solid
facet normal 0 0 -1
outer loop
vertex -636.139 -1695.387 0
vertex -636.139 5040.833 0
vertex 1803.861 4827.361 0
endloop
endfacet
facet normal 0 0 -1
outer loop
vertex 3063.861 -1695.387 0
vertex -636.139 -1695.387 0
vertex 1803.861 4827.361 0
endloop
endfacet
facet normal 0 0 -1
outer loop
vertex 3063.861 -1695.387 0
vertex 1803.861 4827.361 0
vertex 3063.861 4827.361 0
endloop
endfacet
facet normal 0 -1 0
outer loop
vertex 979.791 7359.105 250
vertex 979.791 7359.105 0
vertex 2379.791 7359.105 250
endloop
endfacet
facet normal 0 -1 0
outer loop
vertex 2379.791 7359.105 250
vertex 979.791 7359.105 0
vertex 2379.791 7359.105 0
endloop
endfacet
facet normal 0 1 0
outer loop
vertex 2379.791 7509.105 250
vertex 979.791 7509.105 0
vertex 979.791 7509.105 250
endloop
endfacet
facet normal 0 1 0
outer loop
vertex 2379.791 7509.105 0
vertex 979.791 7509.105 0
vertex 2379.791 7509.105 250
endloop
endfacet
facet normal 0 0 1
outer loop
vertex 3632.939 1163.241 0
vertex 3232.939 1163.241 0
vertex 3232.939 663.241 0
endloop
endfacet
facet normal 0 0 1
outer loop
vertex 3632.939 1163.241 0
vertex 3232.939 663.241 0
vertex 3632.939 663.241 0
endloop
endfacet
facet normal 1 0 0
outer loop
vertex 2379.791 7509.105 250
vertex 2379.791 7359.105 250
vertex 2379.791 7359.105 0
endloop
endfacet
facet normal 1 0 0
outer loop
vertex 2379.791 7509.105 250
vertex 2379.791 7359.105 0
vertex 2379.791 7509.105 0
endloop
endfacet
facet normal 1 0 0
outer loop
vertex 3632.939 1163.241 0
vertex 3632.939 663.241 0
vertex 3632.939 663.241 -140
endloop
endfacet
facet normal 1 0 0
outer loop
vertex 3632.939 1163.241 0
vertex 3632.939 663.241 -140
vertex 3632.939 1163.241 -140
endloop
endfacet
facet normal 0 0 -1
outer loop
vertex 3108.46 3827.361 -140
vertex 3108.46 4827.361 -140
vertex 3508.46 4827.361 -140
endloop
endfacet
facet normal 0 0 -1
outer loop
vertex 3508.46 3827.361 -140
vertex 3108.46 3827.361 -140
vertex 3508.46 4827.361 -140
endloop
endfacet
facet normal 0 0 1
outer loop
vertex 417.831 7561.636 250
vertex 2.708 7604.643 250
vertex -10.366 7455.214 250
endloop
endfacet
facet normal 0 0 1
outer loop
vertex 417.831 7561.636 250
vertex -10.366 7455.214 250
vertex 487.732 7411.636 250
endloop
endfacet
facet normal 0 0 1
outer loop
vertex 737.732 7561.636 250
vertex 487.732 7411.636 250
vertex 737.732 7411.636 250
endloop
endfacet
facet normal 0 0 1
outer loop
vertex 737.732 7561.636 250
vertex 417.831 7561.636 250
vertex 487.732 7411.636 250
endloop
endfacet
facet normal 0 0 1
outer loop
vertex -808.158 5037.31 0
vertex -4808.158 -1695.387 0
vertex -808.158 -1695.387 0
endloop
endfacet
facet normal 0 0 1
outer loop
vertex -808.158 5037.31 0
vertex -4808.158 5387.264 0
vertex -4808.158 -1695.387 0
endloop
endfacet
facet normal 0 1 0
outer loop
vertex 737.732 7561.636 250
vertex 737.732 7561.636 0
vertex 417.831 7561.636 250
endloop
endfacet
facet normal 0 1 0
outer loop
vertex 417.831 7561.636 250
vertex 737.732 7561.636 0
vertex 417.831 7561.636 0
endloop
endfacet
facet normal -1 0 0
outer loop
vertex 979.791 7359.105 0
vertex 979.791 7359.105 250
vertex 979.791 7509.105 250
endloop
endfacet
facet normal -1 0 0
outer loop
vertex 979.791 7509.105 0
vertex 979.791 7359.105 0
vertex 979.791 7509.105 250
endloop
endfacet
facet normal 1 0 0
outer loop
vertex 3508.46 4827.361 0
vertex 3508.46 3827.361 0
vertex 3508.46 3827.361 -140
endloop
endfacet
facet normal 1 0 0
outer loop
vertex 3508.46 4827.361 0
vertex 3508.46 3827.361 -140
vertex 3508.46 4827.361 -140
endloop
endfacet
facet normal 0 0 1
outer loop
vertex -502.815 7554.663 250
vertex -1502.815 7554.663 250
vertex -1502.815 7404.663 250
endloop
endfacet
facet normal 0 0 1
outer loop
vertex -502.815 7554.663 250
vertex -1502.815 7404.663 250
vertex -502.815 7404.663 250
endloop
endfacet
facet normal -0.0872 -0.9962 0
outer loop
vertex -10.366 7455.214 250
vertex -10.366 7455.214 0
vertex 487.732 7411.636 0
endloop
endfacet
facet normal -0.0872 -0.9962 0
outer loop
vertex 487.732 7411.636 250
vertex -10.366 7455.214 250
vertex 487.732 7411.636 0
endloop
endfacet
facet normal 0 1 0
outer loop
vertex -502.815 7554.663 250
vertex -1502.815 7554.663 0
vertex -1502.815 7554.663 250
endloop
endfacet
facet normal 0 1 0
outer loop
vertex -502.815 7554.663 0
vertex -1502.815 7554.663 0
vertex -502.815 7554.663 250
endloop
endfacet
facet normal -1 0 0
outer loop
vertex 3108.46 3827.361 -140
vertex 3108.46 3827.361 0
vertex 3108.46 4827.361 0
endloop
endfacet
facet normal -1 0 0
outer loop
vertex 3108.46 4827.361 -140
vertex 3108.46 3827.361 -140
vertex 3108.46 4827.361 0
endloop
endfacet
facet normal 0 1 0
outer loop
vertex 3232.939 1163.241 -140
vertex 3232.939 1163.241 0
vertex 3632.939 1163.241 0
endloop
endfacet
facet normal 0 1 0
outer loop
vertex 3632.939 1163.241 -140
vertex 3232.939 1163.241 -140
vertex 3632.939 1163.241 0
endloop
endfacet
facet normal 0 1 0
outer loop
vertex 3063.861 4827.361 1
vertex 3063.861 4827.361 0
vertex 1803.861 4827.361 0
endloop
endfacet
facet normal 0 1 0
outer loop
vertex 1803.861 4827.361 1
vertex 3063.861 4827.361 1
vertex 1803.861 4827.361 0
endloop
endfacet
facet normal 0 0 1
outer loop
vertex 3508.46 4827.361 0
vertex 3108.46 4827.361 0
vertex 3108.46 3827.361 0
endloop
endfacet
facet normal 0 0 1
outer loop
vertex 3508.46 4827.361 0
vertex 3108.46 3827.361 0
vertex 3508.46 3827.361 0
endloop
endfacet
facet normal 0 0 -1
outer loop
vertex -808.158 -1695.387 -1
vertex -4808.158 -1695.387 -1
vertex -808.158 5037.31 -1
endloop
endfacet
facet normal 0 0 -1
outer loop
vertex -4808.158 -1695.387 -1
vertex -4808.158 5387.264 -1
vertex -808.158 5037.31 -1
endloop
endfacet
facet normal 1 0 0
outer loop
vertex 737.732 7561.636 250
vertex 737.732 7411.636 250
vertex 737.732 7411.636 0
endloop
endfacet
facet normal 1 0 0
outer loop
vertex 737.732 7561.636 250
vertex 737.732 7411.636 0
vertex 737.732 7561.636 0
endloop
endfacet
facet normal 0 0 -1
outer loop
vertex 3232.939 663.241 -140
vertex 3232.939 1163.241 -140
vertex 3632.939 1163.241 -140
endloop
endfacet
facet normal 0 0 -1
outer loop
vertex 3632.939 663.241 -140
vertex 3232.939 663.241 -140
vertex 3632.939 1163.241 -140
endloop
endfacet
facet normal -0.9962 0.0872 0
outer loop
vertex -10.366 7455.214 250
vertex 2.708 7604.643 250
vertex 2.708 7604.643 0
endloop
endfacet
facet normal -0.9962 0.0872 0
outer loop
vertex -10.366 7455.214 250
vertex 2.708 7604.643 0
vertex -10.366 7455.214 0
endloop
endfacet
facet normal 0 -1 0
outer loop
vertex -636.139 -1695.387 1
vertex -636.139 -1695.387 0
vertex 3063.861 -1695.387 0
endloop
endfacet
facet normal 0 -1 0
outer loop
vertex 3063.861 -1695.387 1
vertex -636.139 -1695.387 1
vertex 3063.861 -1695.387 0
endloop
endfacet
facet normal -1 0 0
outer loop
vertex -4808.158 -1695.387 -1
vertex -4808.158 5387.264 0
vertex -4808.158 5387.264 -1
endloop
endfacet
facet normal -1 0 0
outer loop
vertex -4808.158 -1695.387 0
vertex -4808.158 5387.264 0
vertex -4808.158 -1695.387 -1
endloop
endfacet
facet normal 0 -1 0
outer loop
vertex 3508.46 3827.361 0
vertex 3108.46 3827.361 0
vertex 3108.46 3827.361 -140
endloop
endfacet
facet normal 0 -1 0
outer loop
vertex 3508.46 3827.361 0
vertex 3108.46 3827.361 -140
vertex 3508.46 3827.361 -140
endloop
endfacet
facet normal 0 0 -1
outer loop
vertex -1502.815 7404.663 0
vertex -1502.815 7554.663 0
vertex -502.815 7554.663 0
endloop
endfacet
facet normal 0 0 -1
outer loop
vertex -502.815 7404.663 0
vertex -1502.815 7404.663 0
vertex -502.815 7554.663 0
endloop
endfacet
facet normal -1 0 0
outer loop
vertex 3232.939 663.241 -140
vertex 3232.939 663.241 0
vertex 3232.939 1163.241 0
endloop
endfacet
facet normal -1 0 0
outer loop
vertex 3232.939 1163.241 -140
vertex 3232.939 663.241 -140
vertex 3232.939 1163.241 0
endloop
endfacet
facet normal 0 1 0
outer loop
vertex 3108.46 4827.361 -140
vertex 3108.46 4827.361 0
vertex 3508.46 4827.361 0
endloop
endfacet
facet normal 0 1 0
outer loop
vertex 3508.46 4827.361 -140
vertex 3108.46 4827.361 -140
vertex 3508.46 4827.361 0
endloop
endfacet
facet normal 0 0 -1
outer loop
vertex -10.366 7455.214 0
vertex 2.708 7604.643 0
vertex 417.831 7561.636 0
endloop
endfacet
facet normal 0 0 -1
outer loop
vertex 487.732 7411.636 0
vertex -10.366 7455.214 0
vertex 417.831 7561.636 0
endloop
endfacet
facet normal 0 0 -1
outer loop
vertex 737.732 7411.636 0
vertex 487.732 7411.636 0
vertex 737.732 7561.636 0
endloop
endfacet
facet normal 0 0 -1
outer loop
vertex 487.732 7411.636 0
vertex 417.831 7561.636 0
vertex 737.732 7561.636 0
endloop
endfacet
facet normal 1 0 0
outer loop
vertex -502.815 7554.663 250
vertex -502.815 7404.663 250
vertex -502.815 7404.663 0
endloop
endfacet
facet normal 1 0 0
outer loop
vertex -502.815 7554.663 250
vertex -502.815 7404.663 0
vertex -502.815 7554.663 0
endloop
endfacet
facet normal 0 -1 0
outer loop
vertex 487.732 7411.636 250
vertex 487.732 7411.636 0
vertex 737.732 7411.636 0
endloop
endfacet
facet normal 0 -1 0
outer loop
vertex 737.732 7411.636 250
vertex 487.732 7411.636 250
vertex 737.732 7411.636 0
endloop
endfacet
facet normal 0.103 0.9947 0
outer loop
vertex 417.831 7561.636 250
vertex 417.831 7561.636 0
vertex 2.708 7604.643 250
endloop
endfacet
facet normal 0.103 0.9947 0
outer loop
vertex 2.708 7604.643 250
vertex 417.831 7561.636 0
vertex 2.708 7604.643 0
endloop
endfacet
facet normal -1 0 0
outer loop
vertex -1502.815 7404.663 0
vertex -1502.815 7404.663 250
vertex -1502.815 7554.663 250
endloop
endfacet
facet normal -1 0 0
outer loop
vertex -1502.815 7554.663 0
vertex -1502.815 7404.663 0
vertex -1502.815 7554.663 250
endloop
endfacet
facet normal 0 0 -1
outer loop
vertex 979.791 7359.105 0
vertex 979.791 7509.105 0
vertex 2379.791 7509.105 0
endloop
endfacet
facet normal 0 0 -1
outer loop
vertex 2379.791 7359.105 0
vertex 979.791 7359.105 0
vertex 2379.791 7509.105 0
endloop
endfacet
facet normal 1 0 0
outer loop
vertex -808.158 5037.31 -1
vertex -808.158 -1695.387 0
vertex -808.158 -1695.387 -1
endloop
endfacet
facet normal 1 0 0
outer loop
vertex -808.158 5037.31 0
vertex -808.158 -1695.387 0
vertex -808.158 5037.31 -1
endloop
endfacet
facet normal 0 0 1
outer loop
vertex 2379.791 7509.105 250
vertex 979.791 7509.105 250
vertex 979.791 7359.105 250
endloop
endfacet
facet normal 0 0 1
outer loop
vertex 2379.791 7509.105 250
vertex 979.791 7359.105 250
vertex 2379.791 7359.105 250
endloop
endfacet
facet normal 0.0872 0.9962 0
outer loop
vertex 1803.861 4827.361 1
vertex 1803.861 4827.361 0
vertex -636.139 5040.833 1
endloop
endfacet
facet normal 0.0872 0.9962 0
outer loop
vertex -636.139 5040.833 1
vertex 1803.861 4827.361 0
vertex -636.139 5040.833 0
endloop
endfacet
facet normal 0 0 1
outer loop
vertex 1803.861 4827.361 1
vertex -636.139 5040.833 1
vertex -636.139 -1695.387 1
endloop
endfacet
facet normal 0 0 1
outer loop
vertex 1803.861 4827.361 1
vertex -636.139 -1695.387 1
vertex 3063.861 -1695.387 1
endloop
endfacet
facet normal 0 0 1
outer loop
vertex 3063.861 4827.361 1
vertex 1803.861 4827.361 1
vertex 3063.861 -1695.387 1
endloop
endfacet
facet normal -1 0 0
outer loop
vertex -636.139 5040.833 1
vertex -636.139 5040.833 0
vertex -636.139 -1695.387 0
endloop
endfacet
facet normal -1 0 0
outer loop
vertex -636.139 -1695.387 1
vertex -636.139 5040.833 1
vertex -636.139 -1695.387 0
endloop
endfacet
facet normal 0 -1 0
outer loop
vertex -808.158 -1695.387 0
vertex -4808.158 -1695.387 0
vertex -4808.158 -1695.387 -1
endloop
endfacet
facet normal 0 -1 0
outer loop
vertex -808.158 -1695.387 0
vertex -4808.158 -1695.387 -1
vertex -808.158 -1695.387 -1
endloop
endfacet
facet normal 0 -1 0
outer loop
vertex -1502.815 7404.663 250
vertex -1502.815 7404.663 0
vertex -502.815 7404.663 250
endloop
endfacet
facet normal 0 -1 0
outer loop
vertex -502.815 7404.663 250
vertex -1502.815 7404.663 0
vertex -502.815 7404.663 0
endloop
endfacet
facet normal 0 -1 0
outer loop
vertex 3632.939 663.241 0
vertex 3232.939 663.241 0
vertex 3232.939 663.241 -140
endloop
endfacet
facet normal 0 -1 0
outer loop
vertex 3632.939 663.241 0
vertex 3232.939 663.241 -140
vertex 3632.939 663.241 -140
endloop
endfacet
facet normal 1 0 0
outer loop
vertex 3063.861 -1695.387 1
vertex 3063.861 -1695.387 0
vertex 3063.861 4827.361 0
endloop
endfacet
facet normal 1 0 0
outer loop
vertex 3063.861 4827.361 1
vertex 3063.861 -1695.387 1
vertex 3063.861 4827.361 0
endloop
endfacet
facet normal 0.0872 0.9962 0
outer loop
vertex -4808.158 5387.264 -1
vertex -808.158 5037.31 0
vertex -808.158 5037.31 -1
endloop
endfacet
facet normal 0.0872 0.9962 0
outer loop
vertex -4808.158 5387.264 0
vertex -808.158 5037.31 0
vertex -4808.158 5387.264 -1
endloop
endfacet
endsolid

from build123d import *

# Parameters (mm, degrees)
F0_W     = 400
F0_H     = 1000
F1_DEPTH = 140
F0_H_2   = 500
F2_DEPTH = 1
F4_DEPTH = 1
F0_W_2   = 1000
F0_H_3   = 150
F6_DEPTH = 250
F0_W_3   = 1400


# Not quite as in the source:
# - the program builds the solid bodies; features that only make, move or delete a surface that nothing else refers to are left out


with BuildPart() as f1:
    # F0 (on Top) → F1 (new body)
    with BuildSketch(Plane.XY):
        with Locations((3308.4599494934, 4327.3605238324)):
            Rectangle(F0_W, F0_H)
    extrude(amount=-F1_DEPTH)


with BuildPart() as f1b:
    # F0 (on Top) → F1, piece 2 (new body)
    with BuildSketch(Plane.XY):
        with Locations((3432.9387664795, 913.2413864136)):
            Rectangle(F0_W, F0_H_2)
    extrude(amount=-F1_DEPTH)


with BuildPart() as f2:
    # F0 (on Top) → F2 (new body)
    with BuildSketch(Plane.XY):
        Polygon((-4808.1577976546, -1695.3865286843), (-808.1577976546, -1695.3865286843), (-808.1577976546, 5037.3098283165), (-4808.1577976546, 5387.2644824202), align=None)
    extrude(amount=-F2_DEPTH)


with BuildPart() as f4:
    # F0 (on Top) → F4 (new body)
    with BuildSketch(Plane.XY):
        Polygon((-636.1389268665, 5040.8328628357), (-636.1389268665, -1695.3865286843), (3063.8610731335, -1695.3865286843), (3063.8610731335, 4827.3605238324), (1803.8610731335, 4827.3605238324), align=None)
    extrude(amount=F4_DEPTH)


with BuildPart() as f6:
    # F0 (on Top) → F6 (new body)
    with BuildSketch(Plane.XY):
        with Locations((-1002.815246582, 7479.6626091003)):
            Rectangle(F0_W_2, F0_H_3)
    extrude(amount=F6_DEPTH)


with BuildPart() as f6b:
    # F0 (on Top) → F6, piece 2 (new body)
    with BuildSketch(Plane.XY):
        Polygon((487.73180431, 7411.6362518106), (737.73180431, 7411.6362518106), (737.73180431, 7561.6362518106), (417.8309041372, 7561.6362518106), (2.7078166763, 7604.6433278982), (-10.3655447358, 7455.2141231845), align=None)
    extrude(amount=F6_DEPTH)


with BuildPart() as f6c:
    # F0 (on Top) → F6, piece 3 (new body)
    with BuildSketch(Plane.XY):
        with Locations((1679.790687561, 7434.1046333313)):
            Rectangle(F0_W_3, F0_H_3)
    extrude(amount=F6_DEPTH)


solid = Compound([f1.part, f1b.part, f2.part, f4.part, f6.part, f6b.part, f6c.part])
